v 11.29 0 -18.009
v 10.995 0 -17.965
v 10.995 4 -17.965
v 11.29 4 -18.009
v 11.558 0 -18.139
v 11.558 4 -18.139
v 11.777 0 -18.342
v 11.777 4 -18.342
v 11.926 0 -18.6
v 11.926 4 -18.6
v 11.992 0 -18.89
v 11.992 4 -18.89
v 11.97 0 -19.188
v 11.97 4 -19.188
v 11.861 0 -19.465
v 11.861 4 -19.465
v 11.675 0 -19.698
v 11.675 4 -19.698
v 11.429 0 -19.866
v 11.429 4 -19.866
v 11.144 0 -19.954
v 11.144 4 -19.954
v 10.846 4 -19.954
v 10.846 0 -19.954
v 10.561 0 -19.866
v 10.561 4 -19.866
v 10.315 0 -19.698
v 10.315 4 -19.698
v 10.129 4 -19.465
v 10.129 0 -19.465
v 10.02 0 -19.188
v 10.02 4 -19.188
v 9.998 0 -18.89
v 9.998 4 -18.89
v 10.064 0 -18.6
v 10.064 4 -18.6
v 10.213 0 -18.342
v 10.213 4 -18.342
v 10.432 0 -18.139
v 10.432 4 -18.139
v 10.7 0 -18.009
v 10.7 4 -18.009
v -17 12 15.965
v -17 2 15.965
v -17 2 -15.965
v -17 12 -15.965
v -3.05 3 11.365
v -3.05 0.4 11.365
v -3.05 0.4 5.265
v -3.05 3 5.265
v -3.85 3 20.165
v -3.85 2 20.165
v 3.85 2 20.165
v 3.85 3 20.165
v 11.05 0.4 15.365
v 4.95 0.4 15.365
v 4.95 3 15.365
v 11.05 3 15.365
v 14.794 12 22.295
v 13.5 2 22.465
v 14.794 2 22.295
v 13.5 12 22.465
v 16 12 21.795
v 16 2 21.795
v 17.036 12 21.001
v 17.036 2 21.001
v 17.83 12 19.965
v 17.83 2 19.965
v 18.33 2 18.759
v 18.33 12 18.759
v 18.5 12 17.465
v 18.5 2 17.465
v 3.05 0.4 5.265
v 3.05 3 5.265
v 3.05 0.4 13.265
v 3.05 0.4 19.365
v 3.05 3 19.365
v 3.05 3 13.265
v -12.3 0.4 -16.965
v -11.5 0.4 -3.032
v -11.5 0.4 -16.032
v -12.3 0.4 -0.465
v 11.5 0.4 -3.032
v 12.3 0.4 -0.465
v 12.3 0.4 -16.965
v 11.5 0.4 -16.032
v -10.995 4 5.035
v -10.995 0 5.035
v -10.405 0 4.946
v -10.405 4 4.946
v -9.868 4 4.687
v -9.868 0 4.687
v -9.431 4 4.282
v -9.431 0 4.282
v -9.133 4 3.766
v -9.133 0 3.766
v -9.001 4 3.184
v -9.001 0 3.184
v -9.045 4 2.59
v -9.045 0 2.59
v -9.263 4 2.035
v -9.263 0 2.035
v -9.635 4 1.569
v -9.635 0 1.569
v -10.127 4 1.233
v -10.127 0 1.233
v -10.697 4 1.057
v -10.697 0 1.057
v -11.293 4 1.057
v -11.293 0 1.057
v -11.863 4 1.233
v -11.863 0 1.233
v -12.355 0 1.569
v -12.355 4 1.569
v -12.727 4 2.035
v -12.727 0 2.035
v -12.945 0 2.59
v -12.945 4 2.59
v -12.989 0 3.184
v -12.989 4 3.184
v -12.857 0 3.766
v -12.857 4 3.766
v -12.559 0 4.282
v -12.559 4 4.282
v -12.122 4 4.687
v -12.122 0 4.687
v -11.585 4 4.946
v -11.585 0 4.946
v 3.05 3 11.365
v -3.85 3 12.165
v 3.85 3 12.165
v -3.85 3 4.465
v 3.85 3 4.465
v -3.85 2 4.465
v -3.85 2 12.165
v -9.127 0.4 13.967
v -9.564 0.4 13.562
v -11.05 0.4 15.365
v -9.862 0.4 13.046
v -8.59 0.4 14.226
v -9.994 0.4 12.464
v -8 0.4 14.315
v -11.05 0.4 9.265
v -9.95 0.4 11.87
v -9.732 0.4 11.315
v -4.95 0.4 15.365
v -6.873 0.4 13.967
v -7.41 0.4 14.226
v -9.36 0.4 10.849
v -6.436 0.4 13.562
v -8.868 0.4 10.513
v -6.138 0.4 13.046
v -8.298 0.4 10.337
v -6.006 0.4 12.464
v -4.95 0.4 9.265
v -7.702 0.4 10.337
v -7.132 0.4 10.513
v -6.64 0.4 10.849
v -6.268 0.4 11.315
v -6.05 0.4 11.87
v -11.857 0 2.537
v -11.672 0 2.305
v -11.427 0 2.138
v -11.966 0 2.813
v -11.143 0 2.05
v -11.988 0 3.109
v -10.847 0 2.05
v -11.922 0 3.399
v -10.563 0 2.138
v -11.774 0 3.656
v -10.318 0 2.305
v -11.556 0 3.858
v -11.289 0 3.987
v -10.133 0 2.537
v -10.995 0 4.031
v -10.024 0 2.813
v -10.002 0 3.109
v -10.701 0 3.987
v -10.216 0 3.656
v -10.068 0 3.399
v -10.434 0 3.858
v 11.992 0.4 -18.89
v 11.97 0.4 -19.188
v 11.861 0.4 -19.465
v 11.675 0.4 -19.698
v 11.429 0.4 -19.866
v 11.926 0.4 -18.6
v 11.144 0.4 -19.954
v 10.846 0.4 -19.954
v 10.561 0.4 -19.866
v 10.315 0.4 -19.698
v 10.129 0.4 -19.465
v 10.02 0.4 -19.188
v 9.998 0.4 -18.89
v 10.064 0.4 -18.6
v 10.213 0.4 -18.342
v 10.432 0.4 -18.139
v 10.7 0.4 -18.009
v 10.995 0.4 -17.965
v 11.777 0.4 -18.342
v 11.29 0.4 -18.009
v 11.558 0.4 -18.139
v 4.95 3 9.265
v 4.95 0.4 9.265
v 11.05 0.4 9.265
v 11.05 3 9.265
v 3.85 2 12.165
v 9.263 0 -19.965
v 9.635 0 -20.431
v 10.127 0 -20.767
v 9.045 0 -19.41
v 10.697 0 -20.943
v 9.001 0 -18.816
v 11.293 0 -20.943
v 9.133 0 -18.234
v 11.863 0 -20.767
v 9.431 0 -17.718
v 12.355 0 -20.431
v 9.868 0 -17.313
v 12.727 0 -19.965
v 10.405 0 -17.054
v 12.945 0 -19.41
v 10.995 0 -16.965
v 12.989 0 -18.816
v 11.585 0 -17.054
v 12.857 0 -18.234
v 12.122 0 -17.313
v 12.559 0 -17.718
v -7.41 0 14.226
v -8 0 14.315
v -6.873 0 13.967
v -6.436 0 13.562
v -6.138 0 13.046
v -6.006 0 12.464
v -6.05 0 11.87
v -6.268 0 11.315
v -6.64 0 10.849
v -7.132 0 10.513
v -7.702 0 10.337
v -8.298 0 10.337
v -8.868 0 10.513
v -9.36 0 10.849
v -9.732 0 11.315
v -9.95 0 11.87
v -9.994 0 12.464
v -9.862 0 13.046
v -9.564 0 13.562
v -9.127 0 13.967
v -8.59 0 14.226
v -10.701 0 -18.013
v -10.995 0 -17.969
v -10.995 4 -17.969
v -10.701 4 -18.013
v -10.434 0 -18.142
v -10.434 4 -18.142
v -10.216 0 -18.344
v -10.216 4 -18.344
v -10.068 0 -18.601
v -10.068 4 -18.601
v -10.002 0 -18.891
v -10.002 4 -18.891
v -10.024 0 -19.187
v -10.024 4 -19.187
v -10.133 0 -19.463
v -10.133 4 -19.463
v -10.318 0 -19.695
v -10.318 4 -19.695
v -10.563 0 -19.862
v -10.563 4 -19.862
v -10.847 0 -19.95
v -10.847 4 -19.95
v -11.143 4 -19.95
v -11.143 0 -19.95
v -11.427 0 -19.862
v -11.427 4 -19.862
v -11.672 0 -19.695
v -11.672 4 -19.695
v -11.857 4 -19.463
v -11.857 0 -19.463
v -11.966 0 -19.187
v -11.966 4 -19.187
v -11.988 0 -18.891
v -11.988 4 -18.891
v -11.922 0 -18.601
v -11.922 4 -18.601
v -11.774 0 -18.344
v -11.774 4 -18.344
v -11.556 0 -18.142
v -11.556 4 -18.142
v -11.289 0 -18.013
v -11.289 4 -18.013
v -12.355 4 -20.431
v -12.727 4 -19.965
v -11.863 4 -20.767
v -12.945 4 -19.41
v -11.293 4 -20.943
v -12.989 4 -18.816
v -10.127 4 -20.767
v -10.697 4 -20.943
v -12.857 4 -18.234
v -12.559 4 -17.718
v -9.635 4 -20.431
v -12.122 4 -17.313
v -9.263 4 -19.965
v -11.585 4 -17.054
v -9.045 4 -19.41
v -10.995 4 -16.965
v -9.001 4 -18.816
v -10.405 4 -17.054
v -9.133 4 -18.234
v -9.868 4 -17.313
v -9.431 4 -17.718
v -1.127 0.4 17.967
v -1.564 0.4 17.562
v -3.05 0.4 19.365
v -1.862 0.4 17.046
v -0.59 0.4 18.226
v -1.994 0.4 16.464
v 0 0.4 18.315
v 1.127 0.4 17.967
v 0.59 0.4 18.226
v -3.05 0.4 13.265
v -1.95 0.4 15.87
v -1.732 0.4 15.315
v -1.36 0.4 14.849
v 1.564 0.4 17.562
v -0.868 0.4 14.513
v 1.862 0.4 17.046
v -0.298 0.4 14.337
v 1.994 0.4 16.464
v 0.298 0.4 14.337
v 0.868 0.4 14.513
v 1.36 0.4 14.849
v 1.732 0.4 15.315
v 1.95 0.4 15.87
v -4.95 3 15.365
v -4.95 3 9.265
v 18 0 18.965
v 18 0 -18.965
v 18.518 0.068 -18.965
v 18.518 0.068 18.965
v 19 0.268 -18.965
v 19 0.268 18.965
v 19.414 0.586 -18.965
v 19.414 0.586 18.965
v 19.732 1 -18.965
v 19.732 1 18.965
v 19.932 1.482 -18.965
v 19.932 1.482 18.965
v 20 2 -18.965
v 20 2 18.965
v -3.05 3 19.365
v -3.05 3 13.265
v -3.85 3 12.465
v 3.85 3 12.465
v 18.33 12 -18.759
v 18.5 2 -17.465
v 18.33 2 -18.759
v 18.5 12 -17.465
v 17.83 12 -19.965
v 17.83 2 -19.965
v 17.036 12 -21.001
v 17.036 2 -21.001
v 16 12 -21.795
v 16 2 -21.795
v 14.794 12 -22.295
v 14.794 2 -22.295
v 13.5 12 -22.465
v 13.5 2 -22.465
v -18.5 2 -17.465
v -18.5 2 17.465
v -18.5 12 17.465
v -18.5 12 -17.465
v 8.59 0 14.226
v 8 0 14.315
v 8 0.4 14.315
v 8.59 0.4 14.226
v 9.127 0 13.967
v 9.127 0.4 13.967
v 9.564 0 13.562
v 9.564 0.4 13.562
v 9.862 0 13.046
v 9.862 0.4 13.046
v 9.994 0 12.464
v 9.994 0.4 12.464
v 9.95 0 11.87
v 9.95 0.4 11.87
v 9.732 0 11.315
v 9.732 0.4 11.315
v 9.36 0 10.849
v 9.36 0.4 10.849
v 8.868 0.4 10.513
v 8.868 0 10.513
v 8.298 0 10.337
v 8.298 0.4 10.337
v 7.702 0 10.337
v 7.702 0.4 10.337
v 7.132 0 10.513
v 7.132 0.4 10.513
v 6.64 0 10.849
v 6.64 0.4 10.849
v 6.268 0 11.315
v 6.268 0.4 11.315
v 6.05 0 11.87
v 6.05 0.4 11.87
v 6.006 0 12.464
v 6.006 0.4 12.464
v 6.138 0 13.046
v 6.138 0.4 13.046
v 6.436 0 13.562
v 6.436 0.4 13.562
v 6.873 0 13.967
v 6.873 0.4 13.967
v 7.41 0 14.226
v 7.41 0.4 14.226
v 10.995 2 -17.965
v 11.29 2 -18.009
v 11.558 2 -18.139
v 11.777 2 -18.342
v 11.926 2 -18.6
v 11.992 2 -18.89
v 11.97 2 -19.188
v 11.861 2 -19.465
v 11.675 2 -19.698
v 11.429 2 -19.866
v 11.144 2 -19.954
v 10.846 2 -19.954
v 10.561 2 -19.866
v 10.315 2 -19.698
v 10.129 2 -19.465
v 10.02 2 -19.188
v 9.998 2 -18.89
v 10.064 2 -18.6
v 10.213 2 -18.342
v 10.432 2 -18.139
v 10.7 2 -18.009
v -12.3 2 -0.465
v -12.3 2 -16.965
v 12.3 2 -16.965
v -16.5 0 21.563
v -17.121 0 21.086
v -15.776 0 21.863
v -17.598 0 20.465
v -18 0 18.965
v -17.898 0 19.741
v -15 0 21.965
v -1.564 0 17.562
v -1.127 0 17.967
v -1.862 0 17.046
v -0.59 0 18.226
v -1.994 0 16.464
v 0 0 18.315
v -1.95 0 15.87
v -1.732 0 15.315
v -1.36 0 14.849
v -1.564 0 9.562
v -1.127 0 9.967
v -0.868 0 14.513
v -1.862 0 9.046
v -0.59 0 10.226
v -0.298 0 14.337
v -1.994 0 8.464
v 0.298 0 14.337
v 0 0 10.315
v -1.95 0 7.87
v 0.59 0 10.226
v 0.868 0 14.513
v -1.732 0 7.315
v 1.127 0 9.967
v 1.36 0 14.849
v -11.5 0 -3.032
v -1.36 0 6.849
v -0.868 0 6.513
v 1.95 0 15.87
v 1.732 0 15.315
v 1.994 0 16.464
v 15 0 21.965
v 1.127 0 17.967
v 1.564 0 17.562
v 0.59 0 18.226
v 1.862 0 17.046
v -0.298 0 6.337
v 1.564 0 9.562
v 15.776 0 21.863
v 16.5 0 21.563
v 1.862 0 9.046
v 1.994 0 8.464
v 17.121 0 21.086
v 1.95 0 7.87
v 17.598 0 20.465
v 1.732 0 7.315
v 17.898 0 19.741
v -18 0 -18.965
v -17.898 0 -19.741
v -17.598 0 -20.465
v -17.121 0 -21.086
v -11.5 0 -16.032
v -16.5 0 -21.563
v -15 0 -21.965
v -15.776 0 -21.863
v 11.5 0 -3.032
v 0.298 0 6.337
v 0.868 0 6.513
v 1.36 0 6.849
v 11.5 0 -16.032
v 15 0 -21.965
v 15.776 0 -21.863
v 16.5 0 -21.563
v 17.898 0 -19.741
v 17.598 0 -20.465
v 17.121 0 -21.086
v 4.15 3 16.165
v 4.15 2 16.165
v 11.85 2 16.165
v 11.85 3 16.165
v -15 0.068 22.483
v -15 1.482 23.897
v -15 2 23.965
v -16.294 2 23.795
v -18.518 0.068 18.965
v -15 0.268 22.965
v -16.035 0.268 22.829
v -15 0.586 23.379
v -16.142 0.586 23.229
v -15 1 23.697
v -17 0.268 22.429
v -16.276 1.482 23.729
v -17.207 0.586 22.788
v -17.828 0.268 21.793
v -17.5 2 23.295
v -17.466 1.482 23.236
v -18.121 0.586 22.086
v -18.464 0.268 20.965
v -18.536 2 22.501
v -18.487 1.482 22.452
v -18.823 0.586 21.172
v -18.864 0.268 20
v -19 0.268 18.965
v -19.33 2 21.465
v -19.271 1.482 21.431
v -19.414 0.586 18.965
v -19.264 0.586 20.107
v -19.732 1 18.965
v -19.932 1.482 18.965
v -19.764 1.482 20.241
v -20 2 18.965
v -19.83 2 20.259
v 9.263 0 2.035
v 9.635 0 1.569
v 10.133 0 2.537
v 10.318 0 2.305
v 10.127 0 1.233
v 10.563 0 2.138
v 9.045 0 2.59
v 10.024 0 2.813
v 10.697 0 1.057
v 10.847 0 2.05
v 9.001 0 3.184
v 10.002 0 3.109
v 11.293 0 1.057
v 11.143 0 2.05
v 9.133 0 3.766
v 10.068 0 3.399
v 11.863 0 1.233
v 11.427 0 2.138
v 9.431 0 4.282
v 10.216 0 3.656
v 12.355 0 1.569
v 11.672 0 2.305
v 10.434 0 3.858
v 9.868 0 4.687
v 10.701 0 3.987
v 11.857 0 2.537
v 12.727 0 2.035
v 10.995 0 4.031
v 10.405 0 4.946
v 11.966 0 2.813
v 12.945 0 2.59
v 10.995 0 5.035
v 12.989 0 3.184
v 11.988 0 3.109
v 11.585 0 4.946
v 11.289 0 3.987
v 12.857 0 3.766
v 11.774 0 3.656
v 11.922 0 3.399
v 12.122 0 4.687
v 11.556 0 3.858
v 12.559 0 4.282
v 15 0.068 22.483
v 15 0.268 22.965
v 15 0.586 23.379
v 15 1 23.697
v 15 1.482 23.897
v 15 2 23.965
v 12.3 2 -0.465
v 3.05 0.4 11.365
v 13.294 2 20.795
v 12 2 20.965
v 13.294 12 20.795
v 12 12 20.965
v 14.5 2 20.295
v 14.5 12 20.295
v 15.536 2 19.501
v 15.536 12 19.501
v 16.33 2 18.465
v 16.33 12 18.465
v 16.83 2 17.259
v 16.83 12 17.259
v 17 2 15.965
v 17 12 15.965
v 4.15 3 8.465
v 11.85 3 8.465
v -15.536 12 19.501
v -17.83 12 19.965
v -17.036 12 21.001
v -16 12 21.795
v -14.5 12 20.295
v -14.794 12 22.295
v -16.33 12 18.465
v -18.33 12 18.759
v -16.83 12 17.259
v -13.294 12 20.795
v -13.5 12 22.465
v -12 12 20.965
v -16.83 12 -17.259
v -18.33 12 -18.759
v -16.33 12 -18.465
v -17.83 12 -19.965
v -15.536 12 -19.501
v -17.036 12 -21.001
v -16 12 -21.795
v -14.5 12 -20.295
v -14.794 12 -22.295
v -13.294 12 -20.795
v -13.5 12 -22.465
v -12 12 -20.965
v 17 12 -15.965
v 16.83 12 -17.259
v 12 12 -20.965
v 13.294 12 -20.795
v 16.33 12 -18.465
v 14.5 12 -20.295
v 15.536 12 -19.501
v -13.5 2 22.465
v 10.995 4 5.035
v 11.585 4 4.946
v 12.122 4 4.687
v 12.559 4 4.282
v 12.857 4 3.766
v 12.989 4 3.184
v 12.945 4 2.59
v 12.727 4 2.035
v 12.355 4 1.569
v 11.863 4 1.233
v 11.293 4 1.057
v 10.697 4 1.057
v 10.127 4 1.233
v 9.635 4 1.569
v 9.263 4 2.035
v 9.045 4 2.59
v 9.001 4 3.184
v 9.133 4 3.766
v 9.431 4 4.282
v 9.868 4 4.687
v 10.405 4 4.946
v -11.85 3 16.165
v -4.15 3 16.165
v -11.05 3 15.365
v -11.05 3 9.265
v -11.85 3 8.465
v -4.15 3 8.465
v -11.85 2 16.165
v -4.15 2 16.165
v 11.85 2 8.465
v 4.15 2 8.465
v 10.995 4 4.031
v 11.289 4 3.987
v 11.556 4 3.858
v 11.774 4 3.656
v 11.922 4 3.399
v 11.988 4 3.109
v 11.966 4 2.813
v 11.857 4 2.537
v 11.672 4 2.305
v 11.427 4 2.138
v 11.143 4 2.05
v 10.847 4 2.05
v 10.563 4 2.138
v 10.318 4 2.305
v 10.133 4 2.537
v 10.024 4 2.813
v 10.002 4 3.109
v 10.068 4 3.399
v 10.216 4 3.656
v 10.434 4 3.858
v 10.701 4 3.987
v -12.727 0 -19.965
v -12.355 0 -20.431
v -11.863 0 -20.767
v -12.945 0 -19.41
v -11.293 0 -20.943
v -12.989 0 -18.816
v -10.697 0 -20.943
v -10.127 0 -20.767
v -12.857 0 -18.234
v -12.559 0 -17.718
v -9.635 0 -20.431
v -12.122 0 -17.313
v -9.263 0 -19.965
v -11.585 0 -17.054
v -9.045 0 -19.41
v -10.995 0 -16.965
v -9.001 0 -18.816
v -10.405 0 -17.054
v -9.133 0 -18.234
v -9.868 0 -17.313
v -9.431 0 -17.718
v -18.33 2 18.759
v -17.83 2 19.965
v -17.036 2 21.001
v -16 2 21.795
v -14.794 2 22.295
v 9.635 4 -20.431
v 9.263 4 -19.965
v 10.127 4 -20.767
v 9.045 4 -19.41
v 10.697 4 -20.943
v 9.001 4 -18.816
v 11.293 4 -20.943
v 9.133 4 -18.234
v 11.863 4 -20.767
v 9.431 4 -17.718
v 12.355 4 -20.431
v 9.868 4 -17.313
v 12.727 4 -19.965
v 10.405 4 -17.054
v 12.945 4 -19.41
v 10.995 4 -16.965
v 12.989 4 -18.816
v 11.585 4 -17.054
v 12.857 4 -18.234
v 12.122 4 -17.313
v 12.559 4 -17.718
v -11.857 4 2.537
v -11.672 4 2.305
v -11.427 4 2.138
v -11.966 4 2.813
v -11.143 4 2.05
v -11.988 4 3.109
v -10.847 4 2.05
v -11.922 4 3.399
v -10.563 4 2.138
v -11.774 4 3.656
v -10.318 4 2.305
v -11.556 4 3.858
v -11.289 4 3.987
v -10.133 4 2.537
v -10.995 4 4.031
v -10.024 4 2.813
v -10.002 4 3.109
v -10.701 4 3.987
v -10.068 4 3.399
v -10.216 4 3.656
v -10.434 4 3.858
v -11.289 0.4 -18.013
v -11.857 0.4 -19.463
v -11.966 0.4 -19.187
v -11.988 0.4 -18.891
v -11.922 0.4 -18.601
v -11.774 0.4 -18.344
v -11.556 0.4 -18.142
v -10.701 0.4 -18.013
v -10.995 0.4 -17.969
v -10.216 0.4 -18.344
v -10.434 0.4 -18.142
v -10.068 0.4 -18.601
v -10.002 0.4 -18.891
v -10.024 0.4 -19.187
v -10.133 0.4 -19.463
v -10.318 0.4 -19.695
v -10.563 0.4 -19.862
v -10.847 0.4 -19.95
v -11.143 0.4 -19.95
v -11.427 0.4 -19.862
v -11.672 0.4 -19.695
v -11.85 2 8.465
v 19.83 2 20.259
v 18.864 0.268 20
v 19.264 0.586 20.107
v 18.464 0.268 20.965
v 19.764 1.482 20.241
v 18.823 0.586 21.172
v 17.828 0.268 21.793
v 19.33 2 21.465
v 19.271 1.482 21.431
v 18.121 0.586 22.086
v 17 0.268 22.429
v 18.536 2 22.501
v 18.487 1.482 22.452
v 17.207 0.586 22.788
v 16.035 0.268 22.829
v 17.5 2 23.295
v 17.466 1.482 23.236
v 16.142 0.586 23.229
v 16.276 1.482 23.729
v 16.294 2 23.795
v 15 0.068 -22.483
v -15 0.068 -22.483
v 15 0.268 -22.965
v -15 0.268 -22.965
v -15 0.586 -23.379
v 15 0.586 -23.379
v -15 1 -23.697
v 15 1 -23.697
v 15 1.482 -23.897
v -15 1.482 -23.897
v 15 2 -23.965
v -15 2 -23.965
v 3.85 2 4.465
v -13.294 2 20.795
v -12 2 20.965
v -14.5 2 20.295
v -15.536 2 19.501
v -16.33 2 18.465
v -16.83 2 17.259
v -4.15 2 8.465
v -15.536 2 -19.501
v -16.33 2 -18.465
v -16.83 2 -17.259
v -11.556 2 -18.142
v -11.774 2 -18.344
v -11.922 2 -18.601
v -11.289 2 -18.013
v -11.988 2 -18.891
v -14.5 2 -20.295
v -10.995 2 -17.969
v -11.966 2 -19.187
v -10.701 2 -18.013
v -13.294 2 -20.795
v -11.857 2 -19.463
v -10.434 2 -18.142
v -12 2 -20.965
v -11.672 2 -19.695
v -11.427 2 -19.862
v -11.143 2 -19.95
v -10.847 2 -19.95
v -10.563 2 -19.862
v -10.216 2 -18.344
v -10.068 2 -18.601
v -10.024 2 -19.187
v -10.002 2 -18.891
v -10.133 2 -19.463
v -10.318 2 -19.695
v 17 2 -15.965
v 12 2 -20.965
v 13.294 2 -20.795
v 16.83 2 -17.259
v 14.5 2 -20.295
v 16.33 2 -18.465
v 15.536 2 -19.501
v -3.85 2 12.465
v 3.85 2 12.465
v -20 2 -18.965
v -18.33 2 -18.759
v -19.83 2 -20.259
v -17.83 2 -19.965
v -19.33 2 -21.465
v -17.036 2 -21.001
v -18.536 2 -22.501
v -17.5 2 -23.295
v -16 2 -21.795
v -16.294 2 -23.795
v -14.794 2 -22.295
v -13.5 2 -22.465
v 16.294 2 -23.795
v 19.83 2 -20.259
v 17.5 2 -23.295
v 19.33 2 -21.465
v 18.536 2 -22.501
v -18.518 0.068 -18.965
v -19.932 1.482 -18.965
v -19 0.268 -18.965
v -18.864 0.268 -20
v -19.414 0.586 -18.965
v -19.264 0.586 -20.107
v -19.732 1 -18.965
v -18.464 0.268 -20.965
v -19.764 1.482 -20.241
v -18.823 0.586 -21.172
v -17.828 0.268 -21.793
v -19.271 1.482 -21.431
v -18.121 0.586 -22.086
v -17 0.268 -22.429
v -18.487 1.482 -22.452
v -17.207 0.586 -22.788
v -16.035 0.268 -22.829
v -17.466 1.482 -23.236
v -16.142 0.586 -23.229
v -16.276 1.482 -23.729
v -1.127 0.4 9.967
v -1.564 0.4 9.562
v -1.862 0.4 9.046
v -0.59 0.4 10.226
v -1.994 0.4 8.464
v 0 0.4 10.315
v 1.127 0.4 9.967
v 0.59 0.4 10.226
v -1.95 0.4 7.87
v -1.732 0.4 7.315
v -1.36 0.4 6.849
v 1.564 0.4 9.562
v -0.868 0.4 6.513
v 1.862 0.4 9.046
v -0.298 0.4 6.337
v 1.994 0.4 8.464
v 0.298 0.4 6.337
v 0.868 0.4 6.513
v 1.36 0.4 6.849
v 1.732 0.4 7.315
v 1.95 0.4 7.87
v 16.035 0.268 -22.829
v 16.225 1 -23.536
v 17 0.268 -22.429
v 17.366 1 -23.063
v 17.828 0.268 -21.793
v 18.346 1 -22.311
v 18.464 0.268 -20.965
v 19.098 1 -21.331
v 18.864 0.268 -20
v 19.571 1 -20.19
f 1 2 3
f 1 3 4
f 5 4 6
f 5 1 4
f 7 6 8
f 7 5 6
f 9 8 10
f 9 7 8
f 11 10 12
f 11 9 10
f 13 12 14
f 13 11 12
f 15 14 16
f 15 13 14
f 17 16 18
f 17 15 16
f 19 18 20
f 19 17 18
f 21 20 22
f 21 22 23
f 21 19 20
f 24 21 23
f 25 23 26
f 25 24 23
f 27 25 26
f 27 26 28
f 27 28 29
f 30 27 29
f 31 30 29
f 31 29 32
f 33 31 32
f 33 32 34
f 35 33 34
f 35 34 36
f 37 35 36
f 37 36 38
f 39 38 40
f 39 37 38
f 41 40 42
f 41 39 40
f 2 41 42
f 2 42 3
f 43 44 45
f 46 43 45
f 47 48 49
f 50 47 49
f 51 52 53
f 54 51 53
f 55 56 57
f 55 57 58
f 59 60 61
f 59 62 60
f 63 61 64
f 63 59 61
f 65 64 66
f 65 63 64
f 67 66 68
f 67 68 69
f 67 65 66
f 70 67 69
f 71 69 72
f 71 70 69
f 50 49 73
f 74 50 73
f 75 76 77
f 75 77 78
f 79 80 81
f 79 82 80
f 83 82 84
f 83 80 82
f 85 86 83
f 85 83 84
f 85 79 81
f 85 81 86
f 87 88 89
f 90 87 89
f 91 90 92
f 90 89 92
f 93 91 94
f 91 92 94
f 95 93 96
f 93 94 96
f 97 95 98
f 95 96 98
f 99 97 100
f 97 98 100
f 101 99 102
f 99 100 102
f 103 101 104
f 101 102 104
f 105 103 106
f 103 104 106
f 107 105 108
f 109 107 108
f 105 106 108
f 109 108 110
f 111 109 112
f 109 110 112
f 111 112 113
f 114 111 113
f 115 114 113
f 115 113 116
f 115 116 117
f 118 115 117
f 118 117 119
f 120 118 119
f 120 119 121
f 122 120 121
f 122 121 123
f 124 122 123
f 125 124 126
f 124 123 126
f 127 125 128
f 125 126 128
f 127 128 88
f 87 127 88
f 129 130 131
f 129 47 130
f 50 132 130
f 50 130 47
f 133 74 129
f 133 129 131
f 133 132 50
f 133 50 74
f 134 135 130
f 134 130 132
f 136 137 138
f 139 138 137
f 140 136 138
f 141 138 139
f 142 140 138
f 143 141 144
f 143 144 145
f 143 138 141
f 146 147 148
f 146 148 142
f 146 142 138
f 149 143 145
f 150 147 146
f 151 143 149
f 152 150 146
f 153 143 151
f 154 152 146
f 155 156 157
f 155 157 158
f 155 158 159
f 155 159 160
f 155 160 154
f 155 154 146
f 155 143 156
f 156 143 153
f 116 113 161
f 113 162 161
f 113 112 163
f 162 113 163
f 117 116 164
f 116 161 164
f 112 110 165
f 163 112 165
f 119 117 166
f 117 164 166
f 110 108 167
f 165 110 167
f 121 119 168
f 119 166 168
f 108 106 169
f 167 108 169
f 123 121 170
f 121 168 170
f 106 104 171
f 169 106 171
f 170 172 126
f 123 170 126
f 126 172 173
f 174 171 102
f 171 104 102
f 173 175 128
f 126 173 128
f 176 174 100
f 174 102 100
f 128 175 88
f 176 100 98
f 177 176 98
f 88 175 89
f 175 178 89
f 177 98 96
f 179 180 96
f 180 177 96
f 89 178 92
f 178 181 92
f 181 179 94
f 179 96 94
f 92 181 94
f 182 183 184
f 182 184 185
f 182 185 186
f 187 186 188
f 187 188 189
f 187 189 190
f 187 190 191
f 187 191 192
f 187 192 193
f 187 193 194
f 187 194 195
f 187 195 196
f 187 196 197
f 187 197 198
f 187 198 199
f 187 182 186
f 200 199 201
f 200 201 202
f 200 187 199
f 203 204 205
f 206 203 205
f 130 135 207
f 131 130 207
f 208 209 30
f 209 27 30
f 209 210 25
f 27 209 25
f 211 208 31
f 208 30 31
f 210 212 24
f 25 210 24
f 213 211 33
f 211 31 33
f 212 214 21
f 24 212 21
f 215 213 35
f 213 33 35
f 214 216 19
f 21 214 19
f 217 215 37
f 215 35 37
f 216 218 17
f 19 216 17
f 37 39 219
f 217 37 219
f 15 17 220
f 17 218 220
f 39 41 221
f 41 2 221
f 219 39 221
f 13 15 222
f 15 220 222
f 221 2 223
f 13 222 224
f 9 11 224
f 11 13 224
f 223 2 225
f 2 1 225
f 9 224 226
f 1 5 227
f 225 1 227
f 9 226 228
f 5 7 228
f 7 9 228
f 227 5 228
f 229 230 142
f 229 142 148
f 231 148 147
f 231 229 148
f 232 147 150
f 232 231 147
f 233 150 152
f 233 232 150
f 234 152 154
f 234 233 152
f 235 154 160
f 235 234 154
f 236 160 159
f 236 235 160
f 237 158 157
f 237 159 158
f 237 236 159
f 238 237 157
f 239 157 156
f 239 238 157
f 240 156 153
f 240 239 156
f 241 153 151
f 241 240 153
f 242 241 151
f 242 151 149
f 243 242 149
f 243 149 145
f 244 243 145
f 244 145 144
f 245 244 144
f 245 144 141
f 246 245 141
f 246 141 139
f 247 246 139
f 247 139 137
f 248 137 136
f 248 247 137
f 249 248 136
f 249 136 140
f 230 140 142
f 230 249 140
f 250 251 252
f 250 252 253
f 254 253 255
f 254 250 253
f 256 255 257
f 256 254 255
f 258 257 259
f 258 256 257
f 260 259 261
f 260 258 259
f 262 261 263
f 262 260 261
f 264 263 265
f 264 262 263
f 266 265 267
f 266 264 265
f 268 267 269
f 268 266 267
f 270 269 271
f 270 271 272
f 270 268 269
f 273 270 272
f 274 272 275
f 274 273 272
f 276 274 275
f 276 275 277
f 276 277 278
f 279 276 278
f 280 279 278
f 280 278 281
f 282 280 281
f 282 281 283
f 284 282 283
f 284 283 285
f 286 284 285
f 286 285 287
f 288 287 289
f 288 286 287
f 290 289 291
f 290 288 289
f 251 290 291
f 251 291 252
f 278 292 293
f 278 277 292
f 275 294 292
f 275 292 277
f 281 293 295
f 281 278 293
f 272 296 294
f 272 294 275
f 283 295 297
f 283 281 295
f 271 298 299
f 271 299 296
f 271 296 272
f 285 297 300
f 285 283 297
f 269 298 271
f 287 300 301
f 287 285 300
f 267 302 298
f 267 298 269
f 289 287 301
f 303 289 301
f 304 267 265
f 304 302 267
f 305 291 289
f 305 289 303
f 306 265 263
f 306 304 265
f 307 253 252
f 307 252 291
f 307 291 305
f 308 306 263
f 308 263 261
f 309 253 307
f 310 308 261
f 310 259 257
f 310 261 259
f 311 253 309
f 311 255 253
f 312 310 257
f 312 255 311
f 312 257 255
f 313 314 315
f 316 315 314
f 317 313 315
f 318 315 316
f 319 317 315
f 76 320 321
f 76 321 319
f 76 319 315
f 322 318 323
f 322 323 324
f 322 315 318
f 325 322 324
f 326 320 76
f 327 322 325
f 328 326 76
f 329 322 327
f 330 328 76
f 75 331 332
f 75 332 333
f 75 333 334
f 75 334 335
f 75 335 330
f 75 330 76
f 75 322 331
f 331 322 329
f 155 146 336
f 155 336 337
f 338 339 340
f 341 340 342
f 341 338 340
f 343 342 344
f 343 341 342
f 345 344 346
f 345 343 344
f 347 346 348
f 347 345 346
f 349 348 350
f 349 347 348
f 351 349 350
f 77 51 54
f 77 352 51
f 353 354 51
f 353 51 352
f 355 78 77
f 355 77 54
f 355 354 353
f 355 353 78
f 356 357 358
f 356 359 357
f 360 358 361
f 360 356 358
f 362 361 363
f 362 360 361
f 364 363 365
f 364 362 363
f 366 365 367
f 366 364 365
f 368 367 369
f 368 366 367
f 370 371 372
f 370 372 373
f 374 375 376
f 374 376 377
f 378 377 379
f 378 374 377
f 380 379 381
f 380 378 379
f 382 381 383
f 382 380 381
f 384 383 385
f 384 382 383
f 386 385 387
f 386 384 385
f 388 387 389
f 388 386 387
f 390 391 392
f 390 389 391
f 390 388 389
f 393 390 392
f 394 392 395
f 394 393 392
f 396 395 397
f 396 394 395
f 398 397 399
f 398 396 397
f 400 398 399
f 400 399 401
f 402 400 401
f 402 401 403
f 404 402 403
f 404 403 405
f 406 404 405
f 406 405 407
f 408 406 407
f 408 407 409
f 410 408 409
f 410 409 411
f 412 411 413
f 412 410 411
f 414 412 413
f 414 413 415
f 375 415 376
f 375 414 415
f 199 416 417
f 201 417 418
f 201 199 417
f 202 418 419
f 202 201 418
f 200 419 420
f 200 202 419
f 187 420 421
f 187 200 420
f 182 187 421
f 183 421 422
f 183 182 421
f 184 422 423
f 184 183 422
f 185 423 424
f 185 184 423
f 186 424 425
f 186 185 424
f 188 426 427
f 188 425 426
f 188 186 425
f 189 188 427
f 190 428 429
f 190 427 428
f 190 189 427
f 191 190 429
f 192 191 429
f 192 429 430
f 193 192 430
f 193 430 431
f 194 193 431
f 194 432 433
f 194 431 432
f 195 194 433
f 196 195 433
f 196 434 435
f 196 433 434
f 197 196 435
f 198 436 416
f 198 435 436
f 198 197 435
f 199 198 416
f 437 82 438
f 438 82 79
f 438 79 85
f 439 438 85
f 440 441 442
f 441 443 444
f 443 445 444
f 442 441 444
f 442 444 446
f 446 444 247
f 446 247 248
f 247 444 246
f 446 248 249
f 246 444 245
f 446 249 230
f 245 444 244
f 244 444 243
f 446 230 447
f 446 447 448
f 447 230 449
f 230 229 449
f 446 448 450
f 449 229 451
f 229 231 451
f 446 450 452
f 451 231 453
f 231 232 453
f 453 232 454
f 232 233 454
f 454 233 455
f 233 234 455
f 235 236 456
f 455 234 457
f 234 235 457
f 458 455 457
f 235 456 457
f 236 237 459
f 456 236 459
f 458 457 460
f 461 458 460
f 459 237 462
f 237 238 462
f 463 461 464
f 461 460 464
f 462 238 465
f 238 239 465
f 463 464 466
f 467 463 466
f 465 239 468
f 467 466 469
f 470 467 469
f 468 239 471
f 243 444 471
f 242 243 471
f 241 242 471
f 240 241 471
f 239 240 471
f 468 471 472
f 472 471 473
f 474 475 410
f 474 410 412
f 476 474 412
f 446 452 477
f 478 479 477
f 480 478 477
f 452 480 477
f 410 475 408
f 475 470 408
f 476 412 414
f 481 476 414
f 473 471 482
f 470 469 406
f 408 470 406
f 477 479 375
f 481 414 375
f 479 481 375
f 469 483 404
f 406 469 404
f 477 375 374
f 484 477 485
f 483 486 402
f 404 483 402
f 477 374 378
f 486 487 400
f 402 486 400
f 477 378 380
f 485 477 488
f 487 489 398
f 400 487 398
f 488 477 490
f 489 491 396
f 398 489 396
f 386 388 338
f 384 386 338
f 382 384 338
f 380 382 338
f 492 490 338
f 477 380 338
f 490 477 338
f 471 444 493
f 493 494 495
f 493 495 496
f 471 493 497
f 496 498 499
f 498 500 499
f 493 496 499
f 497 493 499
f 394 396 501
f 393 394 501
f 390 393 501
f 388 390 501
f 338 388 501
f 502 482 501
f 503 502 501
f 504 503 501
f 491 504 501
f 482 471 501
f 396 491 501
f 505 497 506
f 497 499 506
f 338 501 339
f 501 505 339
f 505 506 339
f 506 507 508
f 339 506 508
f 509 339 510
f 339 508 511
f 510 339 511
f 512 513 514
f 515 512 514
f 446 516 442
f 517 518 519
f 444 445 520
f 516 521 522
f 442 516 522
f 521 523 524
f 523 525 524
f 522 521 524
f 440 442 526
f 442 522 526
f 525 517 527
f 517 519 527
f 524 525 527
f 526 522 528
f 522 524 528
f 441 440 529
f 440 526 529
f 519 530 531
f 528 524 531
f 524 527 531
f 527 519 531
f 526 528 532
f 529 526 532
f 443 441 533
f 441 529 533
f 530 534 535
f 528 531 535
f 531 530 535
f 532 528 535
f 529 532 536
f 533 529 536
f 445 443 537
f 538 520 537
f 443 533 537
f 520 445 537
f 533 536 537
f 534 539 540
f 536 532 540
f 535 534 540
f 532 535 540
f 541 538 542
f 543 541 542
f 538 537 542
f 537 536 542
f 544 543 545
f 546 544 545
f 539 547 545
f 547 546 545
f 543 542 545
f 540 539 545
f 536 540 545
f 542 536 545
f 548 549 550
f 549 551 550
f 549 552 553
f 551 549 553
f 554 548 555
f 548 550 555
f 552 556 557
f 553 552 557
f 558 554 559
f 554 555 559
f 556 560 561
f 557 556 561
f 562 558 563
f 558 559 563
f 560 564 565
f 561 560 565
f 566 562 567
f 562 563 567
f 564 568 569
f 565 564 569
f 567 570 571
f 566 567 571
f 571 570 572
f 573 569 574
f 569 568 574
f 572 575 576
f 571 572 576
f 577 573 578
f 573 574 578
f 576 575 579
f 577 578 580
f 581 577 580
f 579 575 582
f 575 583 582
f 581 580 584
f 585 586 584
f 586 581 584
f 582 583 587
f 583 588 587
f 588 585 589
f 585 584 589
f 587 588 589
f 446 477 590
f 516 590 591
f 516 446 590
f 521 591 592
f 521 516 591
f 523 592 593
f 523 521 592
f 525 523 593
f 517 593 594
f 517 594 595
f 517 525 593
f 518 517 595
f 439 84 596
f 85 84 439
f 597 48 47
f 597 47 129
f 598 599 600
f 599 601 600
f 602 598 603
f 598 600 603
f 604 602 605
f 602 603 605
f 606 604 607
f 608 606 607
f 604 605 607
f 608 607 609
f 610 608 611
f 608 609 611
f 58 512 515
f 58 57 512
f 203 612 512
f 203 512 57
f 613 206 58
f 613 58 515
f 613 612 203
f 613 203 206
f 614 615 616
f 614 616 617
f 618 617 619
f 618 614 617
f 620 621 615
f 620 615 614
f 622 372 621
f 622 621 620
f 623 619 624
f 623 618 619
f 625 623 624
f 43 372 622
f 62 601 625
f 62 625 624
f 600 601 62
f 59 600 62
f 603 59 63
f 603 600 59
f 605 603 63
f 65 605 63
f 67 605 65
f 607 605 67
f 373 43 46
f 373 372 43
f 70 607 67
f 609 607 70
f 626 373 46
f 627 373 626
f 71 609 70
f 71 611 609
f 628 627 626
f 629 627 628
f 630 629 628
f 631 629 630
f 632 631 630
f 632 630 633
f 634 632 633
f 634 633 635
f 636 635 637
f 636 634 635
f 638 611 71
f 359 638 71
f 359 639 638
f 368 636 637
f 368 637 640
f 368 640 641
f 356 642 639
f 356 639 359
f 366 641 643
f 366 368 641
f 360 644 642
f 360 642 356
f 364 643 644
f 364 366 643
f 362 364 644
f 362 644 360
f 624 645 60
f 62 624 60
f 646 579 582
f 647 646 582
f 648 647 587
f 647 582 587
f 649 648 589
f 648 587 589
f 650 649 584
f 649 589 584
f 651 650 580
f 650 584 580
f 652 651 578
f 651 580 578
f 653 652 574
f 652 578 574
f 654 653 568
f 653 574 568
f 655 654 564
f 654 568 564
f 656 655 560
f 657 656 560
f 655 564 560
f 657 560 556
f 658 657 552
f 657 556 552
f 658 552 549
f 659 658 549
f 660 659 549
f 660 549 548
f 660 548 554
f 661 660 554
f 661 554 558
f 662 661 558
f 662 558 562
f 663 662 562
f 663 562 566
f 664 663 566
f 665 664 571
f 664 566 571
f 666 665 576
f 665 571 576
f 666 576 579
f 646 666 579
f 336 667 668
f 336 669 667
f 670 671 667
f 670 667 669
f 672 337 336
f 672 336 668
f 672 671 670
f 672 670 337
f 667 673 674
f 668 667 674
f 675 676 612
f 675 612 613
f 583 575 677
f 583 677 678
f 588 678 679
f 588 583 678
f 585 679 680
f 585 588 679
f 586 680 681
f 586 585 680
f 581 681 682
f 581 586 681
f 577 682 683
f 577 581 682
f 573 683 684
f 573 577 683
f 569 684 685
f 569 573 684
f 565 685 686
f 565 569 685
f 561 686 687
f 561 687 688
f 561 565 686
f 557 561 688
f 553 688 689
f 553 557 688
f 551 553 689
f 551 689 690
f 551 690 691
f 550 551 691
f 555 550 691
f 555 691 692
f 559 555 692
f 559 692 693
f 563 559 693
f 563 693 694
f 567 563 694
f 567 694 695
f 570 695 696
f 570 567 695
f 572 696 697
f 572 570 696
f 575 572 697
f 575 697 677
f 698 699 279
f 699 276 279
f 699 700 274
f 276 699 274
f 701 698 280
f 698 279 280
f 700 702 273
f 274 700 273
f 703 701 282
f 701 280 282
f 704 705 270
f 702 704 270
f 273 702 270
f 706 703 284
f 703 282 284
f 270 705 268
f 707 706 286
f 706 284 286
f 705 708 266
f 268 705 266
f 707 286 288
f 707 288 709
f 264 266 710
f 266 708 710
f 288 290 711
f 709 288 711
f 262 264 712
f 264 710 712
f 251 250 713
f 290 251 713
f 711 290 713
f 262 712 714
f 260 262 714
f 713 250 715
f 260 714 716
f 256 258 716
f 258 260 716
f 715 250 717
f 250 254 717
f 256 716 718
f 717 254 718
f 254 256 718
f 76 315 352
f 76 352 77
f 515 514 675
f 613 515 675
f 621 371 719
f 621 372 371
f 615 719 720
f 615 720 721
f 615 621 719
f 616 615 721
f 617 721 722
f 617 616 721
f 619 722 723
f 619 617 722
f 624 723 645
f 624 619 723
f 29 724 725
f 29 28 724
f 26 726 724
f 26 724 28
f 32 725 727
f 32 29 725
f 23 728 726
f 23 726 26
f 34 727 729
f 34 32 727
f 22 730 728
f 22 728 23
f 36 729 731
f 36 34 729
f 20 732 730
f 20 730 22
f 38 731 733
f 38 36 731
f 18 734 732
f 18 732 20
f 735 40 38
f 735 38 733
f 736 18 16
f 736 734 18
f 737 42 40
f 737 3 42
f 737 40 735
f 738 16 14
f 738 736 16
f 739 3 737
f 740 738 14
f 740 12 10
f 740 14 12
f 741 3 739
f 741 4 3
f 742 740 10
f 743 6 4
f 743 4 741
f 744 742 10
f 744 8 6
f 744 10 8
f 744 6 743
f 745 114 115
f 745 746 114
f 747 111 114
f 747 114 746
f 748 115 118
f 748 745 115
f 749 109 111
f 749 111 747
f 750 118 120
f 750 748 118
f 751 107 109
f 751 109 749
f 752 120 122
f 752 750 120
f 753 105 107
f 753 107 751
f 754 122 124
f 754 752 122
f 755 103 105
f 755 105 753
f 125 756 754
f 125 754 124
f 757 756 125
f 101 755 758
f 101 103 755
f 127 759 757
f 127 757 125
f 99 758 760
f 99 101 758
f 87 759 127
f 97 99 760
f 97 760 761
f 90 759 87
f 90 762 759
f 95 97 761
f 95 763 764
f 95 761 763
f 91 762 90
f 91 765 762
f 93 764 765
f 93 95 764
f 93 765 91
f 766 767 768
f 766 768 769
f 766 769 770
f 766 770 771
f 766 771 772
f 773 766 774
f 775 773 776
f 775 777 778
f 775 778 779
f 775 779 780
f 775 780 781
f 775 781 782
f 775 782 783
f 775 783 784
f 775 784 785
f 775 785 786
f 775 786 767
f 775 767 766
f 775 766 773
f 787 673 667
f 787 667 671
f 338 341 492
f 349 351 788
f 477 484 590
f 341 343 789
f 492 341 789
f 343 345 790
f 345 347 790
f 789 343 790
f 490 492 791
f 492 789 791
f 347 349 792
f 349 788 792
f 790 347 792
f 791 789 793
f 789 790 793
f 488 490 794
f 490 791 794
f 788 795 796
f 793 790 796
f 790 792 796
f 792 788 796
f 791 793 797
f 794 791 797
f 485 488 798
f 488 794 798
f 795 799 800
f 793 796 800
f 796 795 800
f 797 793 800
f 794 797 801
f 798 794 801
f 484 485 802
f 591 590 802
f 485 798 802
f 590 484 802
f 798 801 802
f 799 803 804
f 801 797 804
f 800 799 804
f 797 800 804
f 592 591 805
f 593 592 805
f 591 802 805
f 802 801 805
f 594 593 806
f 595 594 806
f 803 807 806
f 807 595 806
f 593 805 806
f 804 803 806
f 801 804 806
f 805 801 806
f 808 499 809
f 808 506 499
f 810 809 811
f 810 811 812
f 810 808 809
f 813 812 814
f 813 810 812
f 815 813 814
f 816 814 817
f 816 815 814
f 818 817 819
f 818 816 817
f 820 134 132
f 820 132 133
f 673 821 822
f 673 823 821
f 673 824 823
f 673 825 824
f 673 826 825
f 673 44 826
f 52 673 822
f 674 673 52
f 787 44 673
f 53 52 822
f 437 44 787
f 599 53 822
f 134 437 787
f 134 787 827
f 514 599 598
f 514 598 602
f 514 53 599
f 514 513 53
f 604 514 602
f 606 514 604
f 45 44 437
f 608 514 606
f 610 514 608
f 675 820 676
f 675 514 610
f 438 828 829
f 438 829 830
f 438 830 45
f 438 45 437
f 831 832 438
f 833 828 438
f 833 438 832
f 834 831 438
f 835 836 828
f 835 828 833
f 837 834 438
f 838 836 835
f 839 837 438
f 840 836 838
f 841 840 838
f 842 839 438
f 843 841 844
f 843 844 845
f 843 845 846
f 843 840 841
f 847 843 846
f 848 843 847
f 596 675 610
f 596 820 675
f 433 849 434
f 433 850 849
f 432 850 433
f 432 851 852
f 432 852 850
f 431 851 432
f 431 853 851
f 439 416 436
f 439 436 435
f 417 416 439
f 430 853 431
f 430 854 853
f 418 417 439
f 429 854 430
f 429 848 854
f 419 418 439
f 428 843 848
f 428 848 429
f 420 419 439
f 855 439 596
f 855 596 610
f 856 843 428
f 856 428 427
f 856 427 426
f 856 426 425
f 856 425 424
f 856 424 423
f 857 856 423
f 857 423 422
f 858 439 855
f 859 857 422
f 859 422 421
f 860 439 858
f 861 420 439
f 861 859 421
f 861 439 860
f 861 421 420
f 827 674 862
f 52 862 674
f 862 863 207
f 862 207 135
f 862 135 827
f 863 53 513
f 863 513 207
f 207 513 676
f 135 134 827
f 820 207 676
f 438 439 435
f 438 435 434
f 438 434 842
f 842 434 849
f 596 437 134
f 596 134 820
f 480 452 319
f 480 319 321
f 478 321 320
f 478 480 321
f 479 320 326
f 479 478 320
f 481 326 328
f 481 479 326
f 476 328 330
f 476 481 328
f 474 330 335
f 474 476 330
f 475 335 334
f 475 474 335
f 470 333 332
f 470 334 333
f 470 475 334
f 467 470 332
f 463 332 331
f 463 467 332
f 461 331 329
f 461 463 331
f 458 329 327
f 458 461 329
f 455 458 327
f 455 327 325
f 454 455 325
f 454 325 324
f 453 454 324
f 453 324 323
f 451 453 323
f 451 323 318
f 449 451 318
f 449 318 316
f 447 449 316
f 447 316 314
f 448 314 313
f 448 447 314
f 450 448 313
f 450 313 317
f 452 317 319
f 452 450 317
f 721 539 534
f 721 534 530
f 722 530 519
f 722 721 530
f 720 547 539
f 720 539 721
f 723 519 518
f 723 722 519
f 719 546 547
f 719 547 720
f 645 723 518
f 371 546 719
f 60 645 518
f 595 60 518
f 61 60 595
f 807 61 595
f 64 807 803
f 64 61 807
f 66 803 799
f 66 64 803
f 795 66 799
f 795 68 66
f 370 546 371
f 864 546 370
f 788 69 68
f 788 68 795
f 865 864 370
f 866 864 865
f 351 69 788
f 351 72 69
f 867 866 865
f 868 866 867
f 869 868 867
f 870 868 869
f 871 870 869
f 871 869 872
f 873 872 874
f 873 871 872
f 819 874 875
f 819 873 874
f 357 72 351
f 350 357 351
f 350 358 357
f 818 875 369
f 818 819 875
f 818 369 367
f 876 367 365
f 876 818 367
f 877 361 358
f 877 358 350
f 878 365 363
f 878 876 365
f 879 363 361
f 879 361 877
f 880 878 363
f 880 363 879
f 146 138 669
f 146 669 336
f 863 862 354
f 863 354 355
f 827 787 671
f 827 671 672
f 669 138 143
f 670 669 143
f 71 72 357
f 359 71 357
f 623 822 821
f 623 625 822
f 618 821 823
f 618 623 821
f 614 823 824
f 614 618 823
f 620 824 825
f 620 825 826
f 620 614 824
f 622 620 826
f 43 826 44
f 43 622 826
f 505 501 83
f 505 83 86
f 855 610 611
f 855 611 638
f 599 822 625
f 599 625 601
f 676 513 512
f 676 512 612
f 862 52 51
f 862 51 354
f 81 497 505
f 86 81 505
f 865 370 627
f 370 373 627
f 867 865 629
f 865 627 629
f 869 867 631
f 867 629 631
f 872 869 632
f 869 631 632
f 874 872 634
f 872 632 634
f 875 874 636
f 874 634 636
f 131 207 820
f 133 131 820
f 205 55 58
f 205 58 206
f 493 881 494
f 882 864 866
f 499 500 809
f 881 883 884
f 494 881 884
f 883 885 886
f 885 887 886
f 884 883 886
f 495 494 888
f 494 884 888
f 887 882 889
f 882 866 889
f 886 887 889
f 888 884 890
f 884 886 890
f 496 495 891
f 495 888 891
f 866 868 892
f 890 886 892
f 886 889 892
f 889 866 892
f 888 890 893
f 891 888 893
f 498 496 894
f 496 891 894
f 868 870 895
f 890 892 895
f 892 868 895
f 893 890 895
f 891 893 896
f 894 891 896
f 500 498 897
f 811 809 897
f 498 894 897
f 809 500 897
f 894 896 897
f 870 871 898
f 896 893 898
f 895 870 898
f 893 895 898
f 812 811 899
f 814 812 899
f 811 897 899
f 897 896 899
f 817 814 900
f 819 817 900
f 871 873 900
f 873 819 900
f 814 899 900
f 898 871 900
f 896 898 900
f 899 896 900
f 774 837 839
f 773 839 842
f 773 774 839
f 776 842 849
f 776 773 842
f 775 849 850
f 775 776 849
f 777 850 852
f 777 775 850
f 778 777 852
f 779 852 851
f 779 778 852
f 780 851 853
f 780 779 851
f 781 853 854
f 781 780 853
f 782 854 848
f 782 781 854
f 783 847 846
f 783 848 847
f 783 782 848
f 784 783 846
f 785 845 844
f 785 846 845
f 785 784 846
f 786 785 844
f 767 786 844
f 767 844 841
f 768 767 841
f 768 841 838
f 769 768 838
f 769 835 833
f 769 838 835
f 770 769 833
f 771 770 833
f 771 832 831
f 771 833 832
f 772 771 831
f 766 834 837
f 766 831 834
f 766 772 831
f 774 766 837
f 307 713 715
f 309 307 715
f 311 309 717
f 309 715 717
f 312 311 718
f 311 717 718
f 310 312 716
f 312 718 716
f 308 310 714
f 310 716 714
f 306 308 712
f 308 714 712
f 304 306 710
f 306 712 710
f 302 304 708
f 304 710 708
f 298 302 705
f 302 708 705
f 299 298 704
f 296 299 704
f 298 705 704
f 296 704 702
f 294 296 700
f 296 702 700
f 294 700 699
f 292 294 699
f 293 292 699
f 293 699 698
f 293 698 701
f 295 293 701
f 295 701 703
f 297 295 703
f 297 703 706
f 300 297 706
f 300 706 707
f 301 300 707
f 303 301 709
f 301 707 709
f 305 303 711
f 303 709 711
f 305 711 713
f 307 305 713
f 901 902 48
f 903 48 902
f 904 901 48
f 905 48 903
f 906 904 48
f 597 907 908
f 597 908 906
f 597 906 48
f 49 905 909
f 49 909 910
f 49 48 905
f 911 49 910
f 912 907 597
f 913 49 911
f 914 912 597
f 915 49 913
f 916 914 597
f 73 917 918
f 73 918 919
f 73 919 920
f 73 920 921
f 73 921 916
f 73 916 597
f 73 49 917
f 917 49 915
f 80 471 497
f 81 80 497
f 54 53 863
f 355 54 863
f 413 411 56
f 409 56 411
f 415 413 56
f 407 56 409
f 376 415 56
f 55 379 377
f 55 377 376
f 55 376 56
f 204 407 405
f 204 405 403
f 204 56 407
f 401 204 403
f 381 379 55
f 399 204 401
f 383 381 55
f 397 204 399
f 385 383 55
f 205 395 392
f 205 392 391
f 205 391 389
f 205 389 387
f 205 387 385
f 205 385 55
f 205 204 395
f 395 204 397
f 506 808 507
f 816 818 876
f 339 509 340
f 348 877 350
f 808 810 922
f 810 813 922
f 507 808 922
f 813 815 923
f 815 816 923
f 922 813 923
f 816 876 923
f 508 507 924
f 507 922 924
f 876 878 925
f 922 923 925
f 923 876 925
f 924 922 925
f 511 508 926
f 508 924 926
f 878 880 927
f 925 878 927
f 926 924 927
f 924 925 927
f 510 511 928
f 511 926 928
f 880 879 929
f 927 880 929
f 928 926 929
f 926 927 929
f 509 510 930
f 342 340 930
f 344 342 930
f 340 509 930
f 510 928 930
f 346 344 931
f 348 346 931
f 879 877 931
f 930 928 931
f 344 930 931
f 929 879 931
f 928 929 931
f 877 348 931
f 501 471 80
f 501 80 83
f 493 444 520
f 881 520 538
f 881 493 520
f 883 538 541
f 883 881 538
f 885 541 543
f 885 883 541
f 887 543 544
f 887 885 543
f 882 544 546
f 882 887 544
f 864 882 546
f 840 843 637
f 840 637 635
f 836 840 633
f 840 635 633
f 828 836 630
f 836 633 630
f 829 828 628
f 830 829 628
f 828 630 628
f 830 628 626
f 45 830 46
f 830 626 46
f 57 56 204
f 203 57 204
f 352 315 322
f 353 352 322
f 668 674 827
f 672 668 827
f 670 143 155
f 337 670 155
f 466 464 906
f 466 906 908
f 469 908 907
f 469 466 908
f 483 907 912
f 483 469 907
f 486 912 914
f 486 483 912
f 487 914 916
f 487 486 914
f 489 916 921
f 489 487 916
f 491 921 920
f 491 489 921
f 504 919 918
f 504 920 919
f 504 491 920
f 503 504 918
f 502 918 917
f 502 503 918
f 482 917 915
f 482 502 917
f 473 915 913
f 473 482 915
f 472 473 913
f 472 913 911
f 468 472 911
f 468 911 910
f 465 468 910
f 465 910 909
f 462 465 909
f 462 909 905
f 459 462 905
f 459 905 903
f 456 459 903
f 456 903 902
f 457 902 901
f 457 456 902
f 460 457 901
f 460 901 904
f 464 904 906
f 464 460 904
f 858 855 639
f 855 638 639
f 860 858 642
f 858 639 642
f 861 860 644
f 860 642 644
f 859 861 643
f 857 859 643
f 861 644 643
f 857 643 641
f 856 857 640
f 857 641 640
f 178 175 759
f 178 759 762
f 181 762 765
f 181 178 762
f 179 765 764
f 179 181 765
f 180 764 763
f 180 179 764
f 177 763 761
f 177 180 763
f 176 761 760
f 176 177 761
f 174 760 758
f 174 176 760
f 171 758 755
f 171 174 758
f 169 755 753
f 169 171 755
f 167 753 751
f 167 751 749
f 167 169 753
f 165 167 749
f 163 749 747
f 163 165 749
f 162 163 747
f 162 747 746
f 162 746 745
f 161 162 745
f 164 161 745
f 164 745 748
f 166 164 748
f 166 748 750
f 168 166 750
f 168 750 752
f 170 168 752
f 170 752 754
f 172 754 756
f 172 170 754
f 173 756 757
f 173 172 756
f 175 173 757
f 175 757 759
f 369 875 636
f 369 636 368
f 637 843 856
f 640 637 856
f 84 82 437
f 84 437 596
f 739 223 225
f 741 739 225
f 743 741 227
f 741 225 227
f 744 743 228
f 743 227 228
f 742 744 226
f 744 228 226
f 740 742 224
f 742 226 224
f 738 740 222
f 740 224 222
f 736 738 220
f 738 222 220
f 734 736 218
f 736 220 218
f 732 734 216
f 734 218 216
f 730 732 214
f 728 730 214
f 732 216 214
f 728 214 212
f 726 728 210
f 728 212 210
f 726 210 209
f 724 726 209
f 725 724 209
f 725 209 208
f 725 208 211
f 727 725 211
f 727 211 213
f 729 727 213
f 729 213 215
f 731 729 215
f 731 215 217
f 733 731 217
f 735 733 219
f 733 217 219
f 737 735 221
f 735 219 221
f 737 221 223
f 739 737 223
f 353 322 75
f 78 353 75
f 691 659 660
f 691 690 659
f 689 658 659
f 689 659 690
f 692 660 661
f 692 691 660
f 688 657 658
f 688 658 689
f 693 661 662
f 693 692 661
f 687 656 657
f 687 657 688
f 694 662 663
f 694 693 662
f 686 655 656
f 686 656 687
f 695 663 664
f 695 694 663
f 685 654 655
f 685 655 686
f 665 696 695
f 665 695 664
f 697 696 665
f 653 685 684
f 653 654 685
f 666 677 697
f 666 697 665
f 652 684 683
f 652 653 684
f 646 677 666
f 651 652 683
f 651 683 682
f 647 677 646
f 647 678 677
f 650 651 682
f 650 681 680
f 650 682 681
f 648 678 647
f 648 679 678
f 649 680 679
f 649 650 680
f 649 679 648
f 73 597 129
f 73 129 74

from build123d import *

# Parameters (mm, degrees)
SCHIZZO1_W                     = 40
SCHIZZO1_H                     = 47.93
ESTRUSIONE_ESTRUSIONE1_DEPTH   = 2
SCHIZZO1_3_W                   = 37
SCHIZZO1_3_H                   = 44.93
SCHIZZO1_3_W_2                 = 34
SCHIZZO1_3_H_2                 = 41.93
ESTRUSIONE_ESTRUSIONE2_DEPTH   = 12
RACCORDO1_R                    = 5
RACCORDO2_R                    = 2
TAGLIO_ESTRUSIONE1_DEPTH       = 34.441310157
TAGLIO_ESTRUSIONE1_DEPTH_BACK  = 34.441310157
SCHIZZO2_R                     = 2
SCHIZZO2_W                     = 23
SCHIZZO2_H                     = 13
TAGLIO_ESTRUSIONE2_START       = 0.4
SCHIZZO3_R                     = 0.995847047
SCHIZZO3_R_2                   = 1
SCHIZZO3_W                     = 24.6
SCHIZZO3_H                     = 16.5
TAGLIO_ESTRUSIONE2_DEPTH       = 34.041310157
SCHIZZO3_3_R                   = 2
SCHIZZO3_3_R_2                 = 0.995847047
ESTRUSIONE_ESTRUSIONE3_DEPTH   = 4
SCHIZZO3_3_R_3                 = 1
ESTRUSIONE_ESTRUSIONE3_2_DEPTH = 4
ESTRUSIONE_ESTRUSIONE3_3_DEPTH = 4
ESTRUSIONE_ESTRUSIONE3_4_DEPTH = 4
TAGLIO_ESTRUSIONE3_START       = 0.4
SCHIZZO2_5_W                   = 6.1
SCHIZZO2_5_H                   = 6.1
TAGLIO_ESTRUSIONE3_DEPTH       = 34.041310157
SCHIZZO2_6_W                   = 7.7
SCHIZZO2_6_H                   = 7.7
SCHIZZO2_6_W_2                 = 6.1
SCHIZZO2_6_H_2                 = 6.1
ESTRUSIONE_ESTRUSIONE4_DEPTH   = 3


with BuildPart() as part:
    # Schizzo1 → Estrusione-Estrusione1 (new body)
    with BuildSketch(Plane(origin=(0, 0, 0), x_dir=(1, 0, 0), z_dir=(0, 1, 0))):
        Rectangle(SCHIZZO1_W, SCHIZZO1_H)
    extrude(amount=ESTRUSIONE_ESTRUSIONE1_DEPTH)

    # Schizzo1<3> → Estrusione-Estrusione2 (add)
    with BuildSketch(Plane(origin=(0, 0, 0), x_dir=(1, 0, 0), z_dir=(0, 1, 0))):
        Rectangle(SCHIZZO1_3_W, SCHIZZO1_3_H)
        Rectangle(SCHIZZO1_3_W_2, SCHIZZO1_3_H_2, mode=Mode.SUBTRACT)
    extrude(amount=ESTRUSIONE_ESTRUSIONE2_DEPTH)

    # Raccordo1
    raccordo1_edges = [part.edges().sort_by_distance(p)[0] for p in [
        (18.5, 7, -22.465),
        (-18.5, 7, -22.465),
        (-18.5, 7, 22.465),
        (18.5, 7, 22.465),
        (-17, 7, -20.965),
        (-17, 7, 20.965),
        (17, 7, 20.965),
        (17, 7, -20.965),
        (-20, 1, -23.965),
        (20, 1, -23.965),
        (20, 1, 23.965),
        (-20, 1, 23.965),
    ]]
    fillet(raccordo1_edges, radius=RACCORDO1_R)

    # Raccordo2
    raccordo2_edges = [part.edges().sort_by_distance(p)[0] for p in [
        (18.535533906, 0, -22.500533906),
        (0, 0, -23.965),
        (-18.535533906, 0, -22.500533906),
        (-20, 0, 0),
        (-18.535533906, 0, 22.500533906),
        (0, 0, 23.965),
        (18.535533906, 0, 22.500533906),
        (20, 0, 0),
    ]]
    fillet(raccordo2_edges, radius=RACCORDO2_R - 0.0001)  # a hair under: the kernel refuses the full size

    # Schizzo2 → Taglio-Estrusione1 (cut, two sides: drawn at the far end of the back side and taken through both)
    with BuildSketch(Plane(origin=(0, 0, 0), x_dir=(1, 0, 0), z_dir=(0, 1, 0)).offset(-TAGLIO_ESTRUSIONE1_DEPTH_BACK)):
        with Locations(Location((0, -8.314831285, 0), (0, 0, 270))):
            Circle(SCHIZZO2_R)
        with Locations(Location((8, -12.314831285, 0), (0, 0, 270))):
            Circle(SCHIZZO2_R)
        with Locations(Location((0, -16.314831285, 0), (0, 0, 270))):
            Circle(SCHIZZO2_R)
        with Locations(Location((-8, -12.314831285, 0), (0, 0, 270))):
            Circle(SCHIZZO2_R)
        with Locations((0, 9.532336944)):
            Rectangle(SCHIZZO2_W, SCHIZZO2_H)
    extrude(amount=TAGLIO_ESTRUSIONE1_DEPTH + TAGLIO_ESTRUSIONE1_DEPTH_BACK, mode=Mode.SUBTRACT)

    # Schizzo3 → Taglio-Estrusione2 (cut, through all)
    with BuildSketch(Plane(origin=(0, 0, 0), x_dir=(1, 0, 0), z_dir=(0, 1, 0)).offset(TAGLIO_ESTRUSIONE2_START)):
        with Locations(Location((-10.995, 18.965, 0), (0, 0, 270))):
            Circle(SCHIZZO3_R)
        with Locations(Location((10.995, 18.965, 0), (0, 0, 270))):
            Circle(SCHIZZO3_R_2)
        with Locations((0, 8.715)):
            Rectangle(SCHIZZO3_W, SCHIZZO3_H)
    extrude(amount=TAGLIO_ESTRUSIONE2_DEPTH, mode=Mode.SUBTRACT)

    # Schizzo2<5> → Taglio-Estrusione3 (cut, through all)
    with BuildSketch(Plane(origin=(0, 0, 0), x_dir=(1, 0, 0), z_dir=(0, 1, 0)).offset(TAGLIO_ESTRUSIONE3_START)):
        with Locations((0, -8.314831285)):
            Rectangle(SCHIZZO2_5_W, SCHIZZO2_5_H)
        with Locations((8, -12.314831285)):
            Rectangle(SCHIZZO2_5_W, SCHIZZO2_5_H)
        with Locations((0, -16.314831285)):
            Rectangle(SCHIZZO2_5_W, SCHIZZO2_5_H)
        with Locations((-8, -12.314831285)):
            Rectangle(SCHIZZO2_5_W, SCHIZZO2_5_H)
    extrude(amount=TAGLIO_ESTRUSIONE3_DEPTH, mode=Mode.SUBTRACT)

    # Schizzo2<6> → Estrusione-Estrusione4 (add)
    # profile 1 of 4: a face of its own
    with BuildSketch(Plane(origin=(0, 0, 0), x_dir=(1, 0, 0), z_dir=(0, 1, 0))):
        with Locations((0, -8.314831285)):
            Rectangle(SCHIZZO2_6_W, SCHIZZO2_6_H)
        with Locations((0, -8.314831285)):
            Rectangle(SCHIZZO2_6_W_2, SCHIZZO2_6_H_2, mode=Mode.SUBTRACT)
    # profile 2 of 4: a face of its own
    with BuildSketch(Plane(origin=(0, 0, 0), x_dir=(1, 0, 0), z_dir=(0, 1, 0))):
        with Locations((8, -12.314831285)):
            Rectangle(SCHIZZO2_6_W, SCHIZZO2_6_H)
        with Locations((8, -12.314831285)):
            Rectangle(SCHIZZO2_6_W_2, SCHIZZO2_6_H_2, mode=Mode.SUBTRACT)
    # profile 3 of 4: a face of its own
    with BuildSketch(Plane(origin=(0, 0, 0), x_dir=(1, 0, 0), z_dir=(0, 1, 0))):
        with Locations((0, -16.314831285)):
            Rectangle(SCHIZZO2_6_W, SCHIZZO2_6_H)
        with Locations((0, -16.314831285)):
            Rectangle(SCHIZZO2_6_W_2, SCHIZZO2_6_H_2, mode=Mode.SUBTRACT)
    # profile 4 of 4: a face of its own
    with BuildSketch(Plane(origin=(0, 0, 0), x_dir=(1, 0, 0), z_dir=(0, 1, 0))):
        with Locations((-8, -12.314831285)):
            Rectangle(SCHIZZO2_6_W, SCHIZZO2_6_H)
        with Locations((-8, -12.314831285)):
            Rectangle(SCHIZZO2_6_W_2, SCHIZZO2_6_H_2, mode=Mode.SUBTRACT)
    extrude(amount=ESTRUSIONE_ESTRUSIONE4_DEPTH)


with BuildPart() as body_2:
    # Schizzo3<3> → Estrusione-Estrusione3 (new body)
    with BuildSketch(Plane(origin=(0, 0, 0), x_dir=(1, 0, 0), z_dir=(0, 1, 0))):
        with Locations(Location((-10.995, 18.965, 0), (0, 0, 270))):
            Circle(SCHIZZO3_3_R)
        with Locations(Location((-10.995, 18.965, 0), (0, 0, 270))):
            Circle(SCHIZZO3_3_R_2, mode=Mode.SUBTRACT)
    extrude(amount=ESTRUSIONE_ESTRUSIONE3_DEPTH)


with BuildPart() as body_3:
    # Schizzo3<3> → Estrusione-Estrusione3 2 (new body)
    with BuildSketch(Plane(origin=(0, 0, 0), x_dir=(1, 0, 0), z_dir=(0, 1, 0))):
        with Locations(Location((10.995, 18.965, 0), (0, 0, 270))):
            Circle(SCHIZZO3_3_R)
        with Locations(Location((10.995, 18.965, 0), (0, 0, 270))):
            Circle(SCHIZZO3_3_R_3, mode=Mode.SUBTRACT)
    extrude(amount=ESTRUSIONE_ESTRUSIONE3_2_DEPTH)


with BuildPart() as body_4:
    # Schizzo3<3> → Estrusione-Estrusione3 3 (new body)
    with BuildSketch(Plane(origin=(0, 0, 0), x_dir=(1, 0, 0), z_dir=(0, 1, 0))):
        with Locations(Location((-10.995, -3.035, 0), (0, 0, 270))):
            Circle(SCHIZZO3_3_R)
        with Locations(Location((-10.995, -3.035, 0), (0, 0, 270))):
            Circle(SCHIZZO3_3_R_2, mode=Mode.SUBTRACT)
    extrude(amount=ESTRUSIONE_ESTRUSIONE3_3_DEPTH)


with BuildPart() as body_5:
    # Schizzo3<3> → Estrusione-Estrusione3 4 (new body)
    with BuildSketch(Plane(origin=(0, 0, 0), x_dir=(1, 0, 0), z_dir=(0, 1, 0))):
        with Locations(Location((10.995, -3.035, 0), (0, 0, 270))):
            Circle(SCHIZZO3_3_R)
        with Locations(Location((10.995, -3.035, 0), (0, 0, 270))):
            Circle(SCHIZZO3_3_R_2, mode=Mode.SUBTRACT)
    extrude(amount=ESTRUSIONE_ESTRUSIONE3_4_DEPTH)


solid = Compound([part.part, body_2.part, body_3.part, body_4.part, body_5.part])
